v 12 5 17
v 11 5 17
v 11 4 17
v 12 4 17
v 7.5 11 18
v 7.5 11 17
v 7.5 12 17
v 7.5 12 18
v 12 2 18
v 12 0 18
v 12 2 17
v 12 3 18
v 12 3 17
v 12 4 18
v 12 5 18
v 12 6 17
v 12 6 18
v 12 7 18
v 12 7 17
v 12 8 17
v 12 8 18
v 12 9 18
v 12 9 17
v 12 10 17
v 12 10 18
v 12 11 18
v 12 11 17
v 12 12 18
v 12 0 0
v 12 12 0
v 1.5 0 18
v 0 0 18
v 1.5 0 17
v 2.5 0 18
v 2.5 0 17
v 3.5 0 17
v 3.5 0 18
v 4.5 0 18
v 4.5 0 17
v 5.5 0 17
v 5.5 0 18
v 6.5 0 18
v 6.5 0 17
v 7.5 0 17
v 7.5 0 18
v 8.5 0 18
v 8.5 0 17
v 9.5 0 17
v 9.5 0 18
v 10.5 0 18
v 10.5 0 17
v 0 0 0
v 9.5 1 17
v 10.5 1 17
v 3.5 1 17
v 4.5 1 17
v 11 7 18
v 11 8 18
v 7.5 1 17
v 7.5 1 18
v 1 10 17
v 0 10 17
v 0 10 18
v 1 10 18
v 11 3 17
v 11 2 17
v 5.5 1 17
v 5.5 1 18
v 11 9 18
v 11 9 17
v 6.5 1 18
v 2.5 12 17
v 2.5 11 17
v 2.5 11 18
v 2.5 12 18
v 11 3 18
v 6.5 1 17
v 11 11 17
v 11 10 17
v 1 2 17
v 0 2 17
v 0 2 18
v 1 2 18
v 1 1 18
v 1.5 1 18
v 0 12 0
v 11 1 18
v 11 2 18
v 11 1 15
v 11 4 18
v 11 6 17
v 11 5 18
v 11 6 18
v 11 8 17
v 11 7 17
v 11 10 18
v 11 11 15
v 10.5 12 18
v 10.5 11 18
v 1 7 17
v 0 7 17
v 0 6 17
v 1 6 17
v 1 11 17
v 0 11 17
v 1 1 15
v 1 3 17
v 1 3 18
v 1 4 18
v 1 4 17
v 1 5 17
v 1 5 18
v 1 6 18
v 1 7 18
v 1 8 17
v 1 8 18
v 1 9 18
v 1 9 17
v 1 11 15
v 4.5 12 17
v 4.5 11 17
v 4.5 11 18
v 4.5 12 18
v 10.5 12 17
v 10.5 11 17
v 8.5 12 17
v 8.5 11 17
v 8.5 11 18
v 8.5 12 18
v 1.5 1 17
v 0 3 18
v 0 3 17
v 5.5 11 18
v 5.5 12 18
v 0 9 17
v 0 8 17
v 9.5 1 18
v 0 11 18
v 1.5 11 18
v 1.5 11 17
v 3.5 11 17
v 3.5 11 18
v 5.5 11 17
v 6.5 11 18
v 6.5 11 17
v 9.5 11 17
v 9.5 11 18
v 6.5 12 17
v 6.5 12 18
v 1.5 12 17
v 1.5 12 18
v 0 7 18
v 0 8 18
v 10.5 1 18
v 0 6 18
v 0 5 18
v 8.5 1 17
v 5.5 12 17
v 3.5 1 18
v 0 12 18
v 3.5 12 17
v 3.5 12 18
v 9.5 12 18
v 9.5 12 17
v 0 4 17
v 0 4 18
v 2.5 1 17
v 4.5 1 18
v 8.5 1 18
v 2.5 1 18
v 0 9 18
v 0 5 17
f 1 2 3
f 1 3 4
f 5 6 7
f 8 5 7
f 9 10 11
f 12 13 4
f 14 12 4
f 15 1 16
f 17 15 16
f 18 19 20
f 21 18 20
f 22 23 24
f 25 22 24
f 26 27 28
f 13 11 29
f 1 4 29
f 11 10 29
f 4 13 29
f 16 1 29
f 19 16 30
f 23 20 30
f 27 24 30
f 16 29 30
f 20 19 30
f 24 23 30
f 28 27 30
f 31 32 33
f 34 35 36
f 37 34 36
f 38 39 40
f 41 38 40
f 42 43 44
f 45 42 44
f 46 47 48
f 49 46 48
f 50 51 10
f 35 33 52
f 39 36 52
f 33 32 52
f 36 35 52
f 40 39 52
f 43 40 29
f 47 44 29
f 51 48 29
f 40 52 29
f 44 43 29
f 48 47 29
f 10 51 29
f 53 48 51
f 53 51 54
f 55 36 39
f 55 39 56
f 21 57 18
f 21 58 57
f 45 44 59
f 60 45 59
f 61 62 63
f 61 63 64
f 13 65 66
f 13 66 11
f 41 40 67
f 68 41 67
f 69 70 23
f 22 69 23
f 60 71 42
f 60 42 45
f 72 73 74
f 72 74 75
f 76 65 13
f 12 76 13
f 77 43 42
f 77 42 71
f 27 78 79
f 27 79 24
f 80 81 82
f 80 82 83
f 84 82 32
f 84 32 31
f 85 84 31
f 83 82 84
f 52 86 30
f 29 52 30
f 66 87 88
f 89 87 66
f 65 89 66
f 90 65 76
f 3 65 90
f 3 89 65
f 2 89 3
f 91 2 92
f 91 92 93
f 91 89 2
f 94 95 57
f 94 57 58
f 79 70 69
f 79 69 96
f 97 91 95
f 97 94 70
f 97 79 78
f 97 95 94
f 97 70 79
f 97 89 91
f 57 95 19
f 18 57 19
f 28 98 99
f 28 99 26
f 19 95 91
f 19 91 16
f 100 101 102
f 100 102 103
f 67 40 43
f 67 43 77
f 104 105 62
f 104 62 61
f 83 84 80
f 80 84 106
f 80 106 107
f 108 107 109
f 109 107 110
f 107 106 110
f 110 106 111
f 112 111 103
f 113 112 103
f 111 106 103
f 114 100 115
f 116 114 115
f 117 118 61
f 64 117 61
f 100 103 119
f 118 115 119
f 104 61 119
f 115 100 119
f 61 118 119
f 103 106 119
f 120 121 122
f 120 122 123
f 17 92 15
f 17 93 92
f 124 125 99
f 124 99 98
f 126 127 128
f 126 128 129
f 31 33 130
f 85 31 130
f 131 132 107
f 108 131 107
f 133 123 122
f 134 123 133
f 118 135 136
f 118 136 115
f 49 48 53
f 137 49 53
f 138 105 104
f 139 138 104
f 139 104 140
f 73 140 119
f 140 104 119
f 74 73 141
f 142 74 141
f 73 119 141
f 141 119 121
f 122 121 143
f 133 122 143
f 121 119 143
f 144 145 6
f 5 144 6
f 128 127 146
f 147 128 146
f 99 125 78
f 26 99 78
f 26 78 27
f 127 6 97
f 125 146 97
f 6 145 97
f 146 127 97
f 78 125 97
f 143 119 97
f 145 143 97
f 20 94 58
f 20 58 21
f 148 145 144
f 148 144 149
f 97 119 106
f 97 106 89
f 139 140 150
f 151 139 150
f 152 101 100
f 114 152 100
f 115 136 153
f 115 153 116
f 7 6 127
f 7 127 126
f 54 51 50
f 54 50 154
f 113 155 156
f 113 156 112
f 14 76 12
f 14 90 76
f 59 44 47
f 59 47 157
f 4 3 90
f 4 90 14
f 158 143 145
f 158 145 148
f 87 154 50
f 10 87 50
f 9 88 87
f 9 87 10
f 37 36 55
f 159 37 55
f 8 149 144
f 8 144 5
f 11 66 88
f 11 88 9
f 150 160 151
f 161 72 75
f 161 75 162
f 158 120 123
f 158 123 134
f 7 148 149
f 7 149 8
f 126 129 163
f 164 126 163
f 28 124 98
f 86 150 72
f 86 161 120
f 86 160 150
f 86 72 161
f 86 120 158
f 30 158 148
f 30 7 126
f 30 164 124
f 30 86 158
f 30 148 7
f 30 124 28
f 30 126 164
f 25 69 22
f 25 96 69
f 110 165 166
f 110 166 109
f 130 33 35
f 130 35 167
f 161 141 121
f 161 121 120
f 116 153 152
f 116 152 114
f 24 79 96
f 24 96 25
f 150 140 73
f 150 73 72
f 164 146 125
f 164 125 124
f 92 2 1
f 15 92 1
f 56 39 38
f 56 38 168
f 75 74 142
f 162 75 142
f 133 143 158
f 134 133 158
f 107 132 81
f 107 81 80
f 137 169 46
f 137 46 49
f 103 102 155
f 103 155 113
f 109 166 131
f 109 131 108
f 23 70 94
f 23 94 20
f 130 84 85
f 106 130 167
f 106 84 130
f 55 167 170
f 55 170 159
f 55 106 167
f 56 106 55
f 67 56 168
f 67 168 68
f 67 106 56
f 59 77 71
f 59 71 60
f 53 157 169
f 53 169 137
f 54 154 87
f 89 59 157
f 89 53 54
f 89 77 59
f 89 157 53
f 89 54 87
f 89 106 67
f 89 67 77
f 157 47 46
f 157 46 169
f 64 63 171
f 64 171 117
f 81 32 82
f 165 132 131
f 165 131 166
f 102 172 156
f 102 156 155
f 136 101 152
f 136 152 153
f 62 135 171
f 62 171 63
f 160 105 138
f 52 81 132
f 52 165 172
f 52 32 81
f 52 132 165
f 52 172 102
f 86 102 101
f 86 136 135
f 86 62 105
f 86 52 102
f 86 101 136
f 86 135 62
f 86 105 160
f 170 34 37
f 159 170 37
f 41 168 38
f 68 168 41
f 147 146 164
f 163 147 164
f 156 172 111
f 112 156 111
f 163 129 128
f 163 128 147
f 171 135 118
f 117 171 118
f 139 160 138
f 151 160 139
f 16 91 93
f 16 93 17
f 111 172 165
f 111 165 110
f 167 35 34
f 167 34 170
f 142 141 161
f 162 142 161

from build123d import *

# Parameters (mm, degrees)
BOX003_W                 = 14
BOX003_H                 = 1
BOX003_DEPTH             = 1
ARRAY001_Y_COUNT         = 5
ARRAY001_Y_PITCH         = 2
ARRAY001_PLACEMENT_ANGLE = 90
BOX002_W                 = 14
BOX002_H                 = 1
BOX002_DEPTH             = 1
ARRAY_Y_COUNT            = 5
ARRAY_Y_PITCH            = 2
BOX001_W                 = 10
BOX001_H                 = 10
BOX001_DEPTH             = 8
BOX_W                    = 12
BOX_H                    = 12
BOX_DEPTH                = 18


with BuildPart() as array001:
    # Box003 → Box003 (new body)
    with BuildSketch(Plane.XY):
        with Locations((7, 0.5)):
            Rectangle(BOX003_W, BOX003_H)
    extrude(amount=BOX003_DEPTH)

    # Array001 Y: Array001 ×5


with BuildPart() as array001_1:
    add(array001.part)
    with Locations(*[(0, i * ARRAY001_Y_PITCH, 0) for i in range(1, ARRAY001_Y_COUNT)]):
        add(array001.part)


with BuildPart() as array001_2:
    # Array001 placement: moved
    add(array001_1.part.moved(Location((10.5, -1.5, 17))).rotate(Axis((10.5, -1.5, 17), (0, 0, 1)), ARRAY001_PLACEMENT_ANGLE))


with BuildPart() as array:
    # Box002 → Box002 (new body)
    with BuildSketch(Plane.XY):
        with Locations((7, 0.5)):
            Rectangle(BOX002_W, BOX002_H)
    extrude(amount=BOX002_DEPTH)

    # Array Y: Array ×5


with BuildPart() as array_1:
    add(array.part)
    with Locations(*[(0, i * ARRAY_Y_PITCH, 0) for i in range(1, ARRAY_Y_COUNT)]):
        add(array.part)


with BuildPart() as array_2:
    # Array placement: moved
    add(array_1.part.moved(Location((-1, 2, 17))))


with BuildPart() as cub001:
    # Box001 → Box001 (new body)
    with BuildSketch(Plane(origin=(1, 1, 15), x_dir=(1, 0, 0), z_dir=(0, 0, 1))):
        with Locations((5, 5)):
            Rectangle(BOX001_W, BOX001_H)
    extrude(amount=BOX001_DEPTH)


with BuildPart() as cut002:
    # Box → Box (new body)
    with BuildSketch(Plane.XY):
        with Locations((6, 6)):
            Rectangle(BOX_W, BOX_H)
    extrude(amount=BOX_DEPTH)

    # Cut: cut Cub001
    add(cub001.part, mode=Mode.SUBTRACT)

    # Cut001: cut Array
    add(array_2.part, mode=Mode.SUBTRACT)

    # Cut002: cut Array001
    add(array001_2.part, mode=Mode.SUBTRACT)


solid = cut002.part
